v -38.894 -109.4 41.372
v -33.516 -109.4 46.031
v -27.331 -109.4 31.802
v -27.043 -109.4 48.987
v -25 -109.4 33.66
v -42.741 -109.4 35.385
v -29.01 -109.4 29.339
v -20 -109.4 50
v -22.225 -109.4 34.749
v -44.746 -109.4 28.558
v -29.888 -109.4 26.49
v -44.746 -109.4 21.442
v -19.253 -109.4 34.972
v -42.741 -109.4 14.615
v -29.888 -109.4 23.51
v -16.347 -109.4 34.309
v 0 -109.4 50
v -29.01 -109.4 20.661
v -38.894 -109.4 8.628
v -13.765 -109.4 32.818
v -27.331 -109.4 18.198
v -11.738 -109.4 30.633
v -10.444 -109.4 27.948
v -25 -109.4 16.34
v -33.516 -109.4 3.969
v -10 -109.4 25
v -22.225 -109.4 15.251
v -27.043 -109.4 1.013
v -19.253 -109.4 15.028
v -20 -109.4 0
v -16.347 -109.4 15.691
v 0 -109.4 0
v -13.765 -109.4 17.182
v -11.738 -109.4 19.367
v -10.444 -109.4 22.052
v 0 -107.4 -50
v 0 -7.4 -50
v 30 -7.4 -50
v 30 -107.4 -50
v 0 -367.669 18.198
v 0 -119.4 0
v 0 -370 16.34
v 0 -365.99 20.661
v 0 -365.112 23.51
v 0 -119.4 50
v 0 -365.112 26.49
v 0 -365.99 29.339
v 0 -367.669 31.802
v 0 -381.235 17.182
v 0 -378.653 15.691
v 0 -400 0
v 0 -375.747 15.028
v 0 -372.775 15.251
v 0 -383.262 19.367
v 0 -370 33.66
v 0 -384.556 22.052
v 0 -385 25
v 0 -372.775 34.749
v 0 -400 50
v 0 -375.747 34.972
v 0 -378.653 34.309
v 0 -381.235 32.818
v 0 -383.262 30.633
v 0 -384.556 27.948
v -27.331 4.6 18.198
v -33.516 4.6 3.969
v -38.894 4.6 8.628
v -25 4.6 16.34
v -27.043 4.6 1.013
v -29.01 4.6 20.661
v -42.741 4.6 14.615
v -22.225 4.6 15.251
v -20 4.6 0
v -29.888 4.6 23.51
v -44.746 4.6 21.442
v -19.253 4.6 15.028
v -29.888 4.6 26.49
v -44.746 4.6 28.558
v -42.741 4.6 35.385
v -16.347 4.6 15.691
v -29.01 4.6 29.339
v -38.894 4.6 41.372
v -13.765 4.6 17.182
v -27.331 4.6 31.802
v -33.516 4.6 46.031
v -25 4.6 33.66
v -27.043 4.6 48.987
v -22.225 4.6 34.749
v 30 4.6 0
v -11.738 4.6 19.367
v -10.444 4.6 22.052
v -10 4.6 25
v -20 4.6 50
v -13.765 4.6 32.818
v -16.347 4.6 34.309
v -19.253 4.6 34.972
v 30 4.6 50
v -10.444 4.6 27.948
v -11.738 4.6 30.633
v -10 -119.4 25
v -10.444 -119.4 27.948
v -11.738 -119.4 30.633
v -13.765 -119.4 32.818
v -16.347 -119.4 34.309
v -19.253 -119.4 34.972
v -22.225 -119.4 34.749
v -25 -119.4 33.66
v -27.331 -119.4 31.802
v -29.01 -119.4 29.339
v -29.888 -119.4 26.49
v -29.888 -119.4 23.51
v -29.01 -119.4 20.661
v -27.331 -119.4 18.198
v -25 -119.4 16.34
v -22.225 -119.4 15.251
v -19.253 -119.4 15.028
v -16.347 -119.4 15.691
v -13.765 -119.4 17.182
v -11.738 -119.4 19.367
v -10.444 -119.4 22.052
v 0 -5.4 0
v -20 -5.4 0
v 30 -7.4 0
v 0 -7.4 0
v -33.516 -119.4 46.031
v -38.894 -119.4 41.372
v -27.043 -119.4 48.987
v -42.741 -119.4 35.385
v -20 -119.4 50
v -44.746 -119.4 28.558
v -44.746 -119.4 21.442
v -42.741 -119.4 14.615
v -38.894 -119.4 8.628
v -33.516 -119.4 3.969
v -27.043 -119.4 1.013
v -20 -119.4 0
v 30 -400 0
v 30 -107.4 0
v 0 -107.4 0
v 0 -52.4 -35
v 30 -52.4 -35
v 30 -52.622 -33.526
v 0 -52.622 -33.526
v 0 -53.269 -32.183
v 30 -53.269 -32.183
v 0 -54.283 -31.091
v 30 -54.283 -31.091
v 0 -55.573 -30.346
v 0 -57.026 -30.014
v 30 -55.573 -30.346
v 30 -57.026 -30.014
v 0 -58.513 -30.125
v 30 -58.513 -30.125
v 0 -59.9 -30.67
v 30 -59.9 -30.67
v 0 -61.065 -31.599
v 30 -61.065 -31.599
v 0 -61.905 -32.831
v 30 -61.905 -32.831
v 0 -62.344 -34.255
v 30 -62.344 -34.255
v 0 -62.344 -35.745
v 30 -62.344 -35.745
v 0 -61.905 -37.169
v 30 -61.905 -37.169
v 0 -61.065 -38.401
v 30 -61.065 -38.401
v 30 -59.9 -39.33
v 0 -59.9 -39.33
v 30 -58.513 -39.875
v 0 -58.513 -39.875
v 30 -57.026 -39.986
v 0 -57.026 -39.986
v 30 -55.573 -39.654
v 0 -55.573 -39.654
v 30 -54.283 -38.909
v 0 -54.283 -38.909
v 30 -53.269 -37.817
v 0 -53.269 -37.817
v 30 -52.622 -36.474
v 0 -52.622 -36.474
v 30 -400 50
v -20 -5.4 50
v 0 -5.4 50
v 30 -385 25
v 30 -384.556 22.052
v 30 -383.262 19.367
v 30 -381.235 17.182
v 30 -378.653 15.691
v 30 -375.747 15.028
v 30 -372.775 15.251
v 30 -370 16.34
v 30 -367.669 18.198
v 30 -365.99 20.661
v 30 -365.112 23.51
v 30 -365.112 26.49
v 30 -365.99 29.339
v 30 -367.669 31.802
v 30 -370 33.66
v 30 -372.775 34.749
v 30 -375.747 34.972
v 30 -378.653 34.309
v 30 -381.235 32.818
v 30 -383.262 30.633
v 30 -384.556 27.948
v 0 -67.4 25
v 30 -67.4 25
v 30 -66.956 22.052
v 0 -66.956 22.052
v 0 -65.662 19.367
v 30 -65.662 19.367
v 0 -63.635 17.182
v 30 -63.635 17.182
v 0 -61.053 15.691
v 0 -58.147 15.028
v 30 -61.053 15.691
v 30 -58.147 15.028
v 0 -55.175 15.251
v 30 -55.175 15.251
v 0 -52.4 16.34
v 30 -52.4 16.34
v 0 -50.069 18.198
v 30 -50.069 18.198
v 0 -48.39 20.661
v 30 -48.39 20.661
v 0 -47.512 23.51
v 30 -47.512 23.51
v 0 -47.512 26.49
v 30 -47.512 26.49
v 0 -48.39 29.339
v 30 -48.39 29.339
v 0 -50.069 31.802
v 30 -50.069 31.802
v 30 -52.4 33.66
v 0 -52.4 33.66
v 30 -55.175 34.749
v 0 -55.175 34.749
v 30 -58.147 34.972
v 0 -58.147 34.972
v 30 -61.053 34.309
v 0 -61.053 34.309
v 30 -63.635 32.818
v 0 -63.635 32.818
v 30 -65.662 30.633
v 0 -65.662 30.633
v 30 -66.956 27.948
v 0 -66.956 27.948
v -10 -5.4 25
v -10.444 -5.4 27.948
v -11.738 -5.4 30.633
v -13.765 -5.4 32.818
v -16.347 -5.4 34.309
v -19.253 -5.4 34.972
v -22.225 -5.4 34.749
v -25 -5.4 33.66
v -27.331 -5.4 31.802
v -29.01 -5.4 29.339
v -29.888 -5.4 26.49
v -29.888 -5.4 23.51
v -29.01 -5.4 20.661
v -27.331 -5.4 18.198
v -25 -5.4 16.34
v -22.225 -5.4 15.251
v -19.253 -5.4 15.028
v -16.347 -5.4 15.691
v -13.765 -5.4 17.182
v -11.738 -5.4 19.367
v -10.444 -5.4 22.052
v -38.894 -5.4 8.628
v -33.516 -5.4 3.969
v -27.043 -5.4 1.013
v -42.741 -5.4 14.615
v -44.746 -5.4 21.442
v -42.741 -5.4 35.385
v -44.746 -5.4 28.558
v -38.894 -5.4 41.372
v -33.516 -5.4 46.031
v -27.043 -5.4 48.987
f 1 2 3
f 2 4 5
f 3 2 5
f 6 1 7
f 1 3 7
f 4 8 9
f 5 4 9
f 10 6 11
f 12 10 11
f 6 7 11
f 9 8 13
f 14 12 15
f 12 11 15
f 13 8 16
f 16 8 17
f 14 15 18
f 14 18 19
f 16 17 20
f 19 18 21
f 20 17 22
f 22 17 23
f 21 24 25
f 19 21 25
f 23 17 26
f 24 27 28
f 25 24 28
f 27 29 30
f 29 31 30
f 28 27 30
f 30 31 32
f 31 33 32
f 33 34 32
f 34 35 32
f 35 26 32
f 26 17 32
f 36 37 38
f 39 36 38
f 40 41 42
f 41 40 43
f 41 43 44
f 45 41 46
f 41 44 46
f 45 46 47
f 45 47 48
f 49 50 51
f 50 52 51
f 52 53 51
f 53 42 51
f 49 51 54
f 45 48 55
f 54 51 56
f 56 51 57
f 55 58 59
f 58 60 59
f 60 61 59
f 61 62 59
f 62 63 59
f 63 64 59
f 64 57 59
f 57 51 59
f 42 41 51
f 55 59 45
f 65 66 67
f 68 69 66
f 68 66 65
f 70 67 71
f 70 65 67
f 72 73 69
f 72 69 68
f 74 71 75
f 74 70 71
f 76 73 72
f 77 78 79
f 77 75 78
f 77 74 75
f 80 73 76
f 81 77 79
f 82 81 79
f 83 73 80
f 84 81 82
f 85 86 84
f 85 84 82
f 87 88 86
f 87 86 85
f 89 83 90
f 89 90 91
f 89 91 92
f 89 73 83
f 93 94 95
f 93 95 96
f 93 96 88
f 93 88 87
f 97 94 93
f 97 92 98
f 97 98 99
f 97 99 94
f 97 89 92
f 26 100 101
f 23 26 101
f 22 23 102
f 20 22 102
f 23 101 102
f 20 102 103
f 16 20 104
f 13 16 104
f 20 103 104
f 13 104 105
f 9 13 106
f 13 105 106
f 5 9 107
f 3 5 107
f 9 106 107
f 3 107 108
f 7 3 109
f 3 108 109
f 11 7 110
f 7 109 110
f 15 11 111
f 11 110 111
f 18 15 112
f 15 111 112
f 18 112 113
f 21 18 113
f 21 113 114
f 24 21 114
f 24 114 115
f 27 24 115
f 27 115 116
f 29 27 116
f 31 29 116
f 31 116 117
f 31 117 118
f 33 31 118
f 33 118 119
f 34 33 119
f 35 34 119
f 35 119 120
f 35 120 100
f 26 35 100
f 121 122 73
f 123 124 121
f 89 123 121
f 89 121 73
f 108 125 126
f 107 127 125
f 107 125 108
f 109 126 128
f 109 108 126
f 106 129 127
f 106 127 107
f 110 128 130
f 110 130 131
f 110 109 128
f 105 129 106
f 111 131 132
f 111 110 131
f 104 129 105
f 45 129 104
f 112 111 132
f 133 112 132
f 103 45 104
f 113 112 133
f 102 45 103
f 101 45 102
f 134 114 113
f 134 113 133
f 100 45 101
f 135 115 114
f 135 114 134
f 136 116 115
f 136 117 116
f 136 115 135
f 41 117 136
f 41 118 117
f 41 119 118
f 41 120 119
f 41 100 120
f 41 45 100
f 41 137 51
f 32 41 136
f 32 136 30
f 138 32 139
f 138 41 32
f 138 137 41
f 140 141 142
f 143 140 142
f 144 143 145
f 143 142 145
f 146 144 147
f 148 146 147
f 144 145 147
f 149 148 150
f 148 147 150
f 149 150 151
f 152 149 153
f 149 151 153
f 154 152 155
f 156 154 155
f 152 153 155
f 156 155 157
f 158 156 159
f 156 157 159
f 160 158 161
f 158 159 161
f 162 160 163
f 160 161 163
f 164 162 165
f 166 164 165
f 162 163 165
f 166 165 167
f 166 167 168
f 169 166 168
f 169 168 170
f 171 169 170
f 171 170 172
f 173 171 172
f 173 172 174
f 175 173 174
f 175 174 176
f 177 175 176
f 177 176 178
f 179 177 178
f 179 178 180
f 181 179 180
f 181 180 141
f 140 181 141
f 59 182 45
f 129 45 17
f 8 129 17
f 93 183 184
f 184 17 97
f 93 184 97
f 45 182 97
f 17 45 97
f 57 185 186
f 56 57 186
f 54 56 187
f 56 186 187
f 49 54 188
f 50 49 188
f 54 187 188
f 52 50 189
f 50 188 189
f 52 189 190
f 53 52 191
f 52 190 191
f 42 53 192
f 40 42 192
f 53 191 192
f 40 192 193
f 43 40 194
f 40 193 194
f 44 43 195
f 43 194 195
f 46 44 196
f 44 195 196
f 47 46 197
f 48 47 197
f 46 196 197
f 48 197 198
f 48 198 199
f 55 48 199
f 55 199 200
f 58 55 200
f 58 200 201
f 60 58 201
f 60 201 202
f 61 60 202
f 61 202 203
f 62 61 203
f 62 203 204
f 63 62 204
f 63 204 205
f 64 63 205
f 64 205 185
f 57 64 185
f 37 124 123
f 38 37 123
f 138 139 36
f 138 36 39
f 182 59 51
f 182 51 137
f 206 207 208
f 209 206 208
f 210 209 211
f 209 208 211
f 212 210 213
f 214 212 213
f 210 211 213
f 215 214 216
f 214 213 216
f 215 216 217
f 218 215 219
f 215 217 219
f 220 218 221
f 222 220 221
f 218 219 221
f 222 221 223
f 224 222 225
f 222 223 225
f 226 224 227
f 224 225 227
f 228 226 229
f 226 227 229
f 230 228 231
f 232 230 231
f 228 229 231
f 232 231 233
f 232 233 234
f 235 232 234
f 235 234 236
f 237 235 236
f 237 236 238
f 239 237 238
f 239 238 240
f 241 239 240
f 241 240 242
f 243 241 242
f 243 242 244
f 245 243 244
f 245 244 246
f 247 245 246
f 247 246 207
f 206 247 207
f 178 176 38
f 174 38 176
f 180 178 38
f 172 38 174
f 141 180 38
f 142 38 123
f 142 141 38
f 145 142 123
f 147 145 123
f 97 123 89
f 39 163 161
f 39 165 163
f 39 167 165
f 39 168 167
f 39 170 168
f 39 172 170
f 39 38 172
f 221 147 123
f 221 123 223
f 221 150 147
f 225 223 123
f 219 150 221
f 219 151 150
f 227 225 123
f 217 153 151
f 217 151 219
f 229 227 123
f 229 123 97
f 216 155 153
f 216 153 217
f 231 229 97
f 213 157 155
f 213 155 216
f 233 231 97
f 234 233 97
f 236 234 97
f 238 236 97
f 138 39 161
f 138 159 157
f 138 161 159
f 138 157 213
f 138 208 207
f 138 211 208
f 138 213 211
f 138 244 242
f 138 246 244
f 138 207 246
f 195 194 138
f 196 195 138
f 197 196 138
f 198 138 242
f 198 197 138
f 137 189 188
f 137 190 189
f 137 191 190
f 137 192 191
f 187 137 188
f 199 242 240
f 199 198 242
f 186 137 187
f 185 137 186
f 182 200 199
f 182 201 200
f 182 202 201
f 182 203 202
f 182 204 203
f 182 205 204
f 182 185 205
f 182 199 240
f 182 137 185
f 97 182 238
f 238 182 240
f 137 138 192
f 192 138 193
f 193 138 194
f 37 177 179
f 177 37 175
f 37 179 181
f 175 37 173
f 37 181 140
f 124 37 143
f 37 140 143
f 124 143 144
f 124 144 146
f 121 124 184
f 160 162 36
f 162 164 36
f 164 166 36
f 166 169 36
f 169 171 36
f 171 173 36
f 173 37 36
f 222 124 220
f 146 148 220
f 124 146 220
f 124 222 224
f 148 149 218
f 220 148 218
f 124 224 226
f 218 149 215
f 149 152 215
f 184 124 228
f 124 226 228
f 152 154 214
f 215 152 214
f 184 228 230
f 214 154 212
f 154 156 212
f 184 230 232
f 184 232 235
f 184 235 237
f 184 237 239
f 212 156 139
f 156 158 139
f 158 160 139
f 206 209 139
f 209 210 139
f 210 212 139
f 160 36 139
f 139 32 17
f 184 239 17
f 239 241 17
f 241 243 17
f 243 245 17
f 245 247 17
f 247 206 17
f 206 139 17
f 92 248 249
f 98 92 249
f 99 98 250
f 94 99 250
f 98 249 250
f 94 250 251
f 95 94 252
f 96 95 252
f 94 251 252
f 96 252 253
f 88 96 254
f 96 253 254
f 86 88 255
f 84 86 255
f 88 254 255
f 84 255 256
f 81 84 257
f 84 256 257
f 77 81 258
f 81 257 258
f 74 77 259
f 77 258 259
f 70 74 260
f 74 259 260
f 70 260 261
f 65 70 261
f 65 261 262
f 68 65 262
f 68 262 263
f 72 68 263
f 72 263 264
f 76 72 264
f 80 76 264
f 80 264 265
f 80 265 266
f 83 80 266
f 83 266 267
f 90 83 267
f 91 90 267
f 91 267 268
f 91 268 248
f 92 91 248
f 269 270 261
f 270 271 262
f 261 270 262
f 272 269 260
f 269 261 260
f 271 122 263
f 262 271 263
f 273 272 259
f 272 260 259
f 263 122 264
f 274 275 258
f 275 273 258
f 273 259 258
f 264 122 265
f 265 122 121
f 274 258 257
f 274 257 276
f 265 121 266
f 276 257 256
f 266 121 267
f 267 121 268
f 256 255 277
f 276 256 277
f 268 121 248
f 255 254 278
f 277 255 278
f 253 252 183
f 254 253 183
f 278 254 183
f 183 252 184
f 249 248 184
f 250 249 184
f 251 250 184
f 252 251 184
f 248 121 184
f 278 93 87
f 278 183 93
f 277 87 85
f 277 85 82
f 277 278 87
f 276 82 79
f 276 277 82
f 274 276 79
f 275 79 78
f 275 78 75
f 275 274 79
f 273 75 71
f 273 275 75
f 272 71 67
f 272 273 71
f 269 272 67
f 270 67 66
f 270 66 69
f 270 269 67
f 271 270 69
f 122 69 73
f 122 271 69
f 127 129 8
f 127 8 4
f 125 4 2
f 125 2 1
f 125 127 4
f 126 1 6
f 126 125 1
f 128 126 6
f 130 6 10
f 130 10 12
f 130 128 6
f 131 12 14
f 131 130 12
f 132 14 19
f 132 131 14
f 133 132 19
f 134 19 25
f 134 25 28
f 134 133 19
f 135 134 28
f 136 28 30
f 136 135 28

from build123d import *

# Parameters (mm, degrees)
F0_W      = 30
F0_H      = 50
F1_DEPTH  = 400
F3_D      = 20
F4_DEPTH  = 4.6
F5_W      = 10
F5_H      = 50
F6_DEPTH  = 20
F7_W      = 10
F7_H      = 25
F9_W      = 10
F9_H      = 25
F12_D     = 20
F13_W     = 30
F13_H     = 100
F14_DEPTH = 50
F16_D     = 10


with BuildPart() as f1:
    # F0 (on Front) → F1 (new body)
    with BuildSketch(Plane.XZ):
        with Locations((15, 25)):
            Rectangle(F0_W, F0_H)
    extrude(amount=F1_DEPTH)

    # F3 (through all)
    with Locations(Plane(origin=(0, 0, 0), x_dir=(0, 1, 0), z_dir=(-1, 0, 0))):
        with Locations((-375, -25), (-57.4, -25)):
            Hole(F3_D / 2)

    # F0 (on Front) → F4 (join)
    with BuildSketch(Plane.XZ):
        with Locations((15, 25)):
            Rectangle(F0_W, F0_H)
    extrude(amount=-F4_DEPTH)

    # F5 (on Right) → F6 (join)
    with BuildSketch(Plane.YZ):
        with Locations((-0.4, 25)):
            Rectangle(F5_W, F5_H)
        with Locations((-114.4, 25)):
            Rectangle(F5_W, F5_H)
    extrude(amount=-F6_DEPTH)

    # F7 (on face) → F8 (revolve)
    with BuildSketch(Plane(origin=(-20, 0, 0), x_dir=(0, -1, 0), z_dir=(-1, 0, 0))):
        with Locations((0.4, 12.5)):
            Rectangle(F7_W, F7_H)
    revolve(axis=Axis((-20, -0.4124408588, 25), (0, -1, 0)))

    # F9 (on face) → F10 (revolve)
    with BuildSketch(Plane(origin=(-20, 0, 0), x_dir=(0, -1, 0), z_dir=(-1, 0, 0))):
        with Locations((114.4, 12.5)):
            Rectangle(F9_W, F9_H)
    revolve(axis=Axis((-20, -114.0791960061, 25), (0, -1, 0)))

    # F12 (through all)
    with Locations(Plane(origin=(0, 4.6, 0), x_dir=(-1, 0, 0), z_dir=(0, 1, 0))):
        with Locations((20, 25)):
            Hole(F12_D / 2)

    # F13 (on face) → F14 (join)
    with BuildSketch(Plane(origin=(0, 0, 0), x_dir=(1, 0, 0), z_dir=(0, 0, -1))):
        with Locations((15, 57.4)):
            Rectangle(F13_W, F13_H)
    extrude(amount=F14_DEPTH)

    # F16 (through all)
    with Locations(Plane(origin=(0, 0, 0), x_dir=(0, -1, 0), z_dir=(-1, 0, 0))):
        with Locations((57.4, -35)):
            Hole(F16_D / 2)


solid = f1.part
